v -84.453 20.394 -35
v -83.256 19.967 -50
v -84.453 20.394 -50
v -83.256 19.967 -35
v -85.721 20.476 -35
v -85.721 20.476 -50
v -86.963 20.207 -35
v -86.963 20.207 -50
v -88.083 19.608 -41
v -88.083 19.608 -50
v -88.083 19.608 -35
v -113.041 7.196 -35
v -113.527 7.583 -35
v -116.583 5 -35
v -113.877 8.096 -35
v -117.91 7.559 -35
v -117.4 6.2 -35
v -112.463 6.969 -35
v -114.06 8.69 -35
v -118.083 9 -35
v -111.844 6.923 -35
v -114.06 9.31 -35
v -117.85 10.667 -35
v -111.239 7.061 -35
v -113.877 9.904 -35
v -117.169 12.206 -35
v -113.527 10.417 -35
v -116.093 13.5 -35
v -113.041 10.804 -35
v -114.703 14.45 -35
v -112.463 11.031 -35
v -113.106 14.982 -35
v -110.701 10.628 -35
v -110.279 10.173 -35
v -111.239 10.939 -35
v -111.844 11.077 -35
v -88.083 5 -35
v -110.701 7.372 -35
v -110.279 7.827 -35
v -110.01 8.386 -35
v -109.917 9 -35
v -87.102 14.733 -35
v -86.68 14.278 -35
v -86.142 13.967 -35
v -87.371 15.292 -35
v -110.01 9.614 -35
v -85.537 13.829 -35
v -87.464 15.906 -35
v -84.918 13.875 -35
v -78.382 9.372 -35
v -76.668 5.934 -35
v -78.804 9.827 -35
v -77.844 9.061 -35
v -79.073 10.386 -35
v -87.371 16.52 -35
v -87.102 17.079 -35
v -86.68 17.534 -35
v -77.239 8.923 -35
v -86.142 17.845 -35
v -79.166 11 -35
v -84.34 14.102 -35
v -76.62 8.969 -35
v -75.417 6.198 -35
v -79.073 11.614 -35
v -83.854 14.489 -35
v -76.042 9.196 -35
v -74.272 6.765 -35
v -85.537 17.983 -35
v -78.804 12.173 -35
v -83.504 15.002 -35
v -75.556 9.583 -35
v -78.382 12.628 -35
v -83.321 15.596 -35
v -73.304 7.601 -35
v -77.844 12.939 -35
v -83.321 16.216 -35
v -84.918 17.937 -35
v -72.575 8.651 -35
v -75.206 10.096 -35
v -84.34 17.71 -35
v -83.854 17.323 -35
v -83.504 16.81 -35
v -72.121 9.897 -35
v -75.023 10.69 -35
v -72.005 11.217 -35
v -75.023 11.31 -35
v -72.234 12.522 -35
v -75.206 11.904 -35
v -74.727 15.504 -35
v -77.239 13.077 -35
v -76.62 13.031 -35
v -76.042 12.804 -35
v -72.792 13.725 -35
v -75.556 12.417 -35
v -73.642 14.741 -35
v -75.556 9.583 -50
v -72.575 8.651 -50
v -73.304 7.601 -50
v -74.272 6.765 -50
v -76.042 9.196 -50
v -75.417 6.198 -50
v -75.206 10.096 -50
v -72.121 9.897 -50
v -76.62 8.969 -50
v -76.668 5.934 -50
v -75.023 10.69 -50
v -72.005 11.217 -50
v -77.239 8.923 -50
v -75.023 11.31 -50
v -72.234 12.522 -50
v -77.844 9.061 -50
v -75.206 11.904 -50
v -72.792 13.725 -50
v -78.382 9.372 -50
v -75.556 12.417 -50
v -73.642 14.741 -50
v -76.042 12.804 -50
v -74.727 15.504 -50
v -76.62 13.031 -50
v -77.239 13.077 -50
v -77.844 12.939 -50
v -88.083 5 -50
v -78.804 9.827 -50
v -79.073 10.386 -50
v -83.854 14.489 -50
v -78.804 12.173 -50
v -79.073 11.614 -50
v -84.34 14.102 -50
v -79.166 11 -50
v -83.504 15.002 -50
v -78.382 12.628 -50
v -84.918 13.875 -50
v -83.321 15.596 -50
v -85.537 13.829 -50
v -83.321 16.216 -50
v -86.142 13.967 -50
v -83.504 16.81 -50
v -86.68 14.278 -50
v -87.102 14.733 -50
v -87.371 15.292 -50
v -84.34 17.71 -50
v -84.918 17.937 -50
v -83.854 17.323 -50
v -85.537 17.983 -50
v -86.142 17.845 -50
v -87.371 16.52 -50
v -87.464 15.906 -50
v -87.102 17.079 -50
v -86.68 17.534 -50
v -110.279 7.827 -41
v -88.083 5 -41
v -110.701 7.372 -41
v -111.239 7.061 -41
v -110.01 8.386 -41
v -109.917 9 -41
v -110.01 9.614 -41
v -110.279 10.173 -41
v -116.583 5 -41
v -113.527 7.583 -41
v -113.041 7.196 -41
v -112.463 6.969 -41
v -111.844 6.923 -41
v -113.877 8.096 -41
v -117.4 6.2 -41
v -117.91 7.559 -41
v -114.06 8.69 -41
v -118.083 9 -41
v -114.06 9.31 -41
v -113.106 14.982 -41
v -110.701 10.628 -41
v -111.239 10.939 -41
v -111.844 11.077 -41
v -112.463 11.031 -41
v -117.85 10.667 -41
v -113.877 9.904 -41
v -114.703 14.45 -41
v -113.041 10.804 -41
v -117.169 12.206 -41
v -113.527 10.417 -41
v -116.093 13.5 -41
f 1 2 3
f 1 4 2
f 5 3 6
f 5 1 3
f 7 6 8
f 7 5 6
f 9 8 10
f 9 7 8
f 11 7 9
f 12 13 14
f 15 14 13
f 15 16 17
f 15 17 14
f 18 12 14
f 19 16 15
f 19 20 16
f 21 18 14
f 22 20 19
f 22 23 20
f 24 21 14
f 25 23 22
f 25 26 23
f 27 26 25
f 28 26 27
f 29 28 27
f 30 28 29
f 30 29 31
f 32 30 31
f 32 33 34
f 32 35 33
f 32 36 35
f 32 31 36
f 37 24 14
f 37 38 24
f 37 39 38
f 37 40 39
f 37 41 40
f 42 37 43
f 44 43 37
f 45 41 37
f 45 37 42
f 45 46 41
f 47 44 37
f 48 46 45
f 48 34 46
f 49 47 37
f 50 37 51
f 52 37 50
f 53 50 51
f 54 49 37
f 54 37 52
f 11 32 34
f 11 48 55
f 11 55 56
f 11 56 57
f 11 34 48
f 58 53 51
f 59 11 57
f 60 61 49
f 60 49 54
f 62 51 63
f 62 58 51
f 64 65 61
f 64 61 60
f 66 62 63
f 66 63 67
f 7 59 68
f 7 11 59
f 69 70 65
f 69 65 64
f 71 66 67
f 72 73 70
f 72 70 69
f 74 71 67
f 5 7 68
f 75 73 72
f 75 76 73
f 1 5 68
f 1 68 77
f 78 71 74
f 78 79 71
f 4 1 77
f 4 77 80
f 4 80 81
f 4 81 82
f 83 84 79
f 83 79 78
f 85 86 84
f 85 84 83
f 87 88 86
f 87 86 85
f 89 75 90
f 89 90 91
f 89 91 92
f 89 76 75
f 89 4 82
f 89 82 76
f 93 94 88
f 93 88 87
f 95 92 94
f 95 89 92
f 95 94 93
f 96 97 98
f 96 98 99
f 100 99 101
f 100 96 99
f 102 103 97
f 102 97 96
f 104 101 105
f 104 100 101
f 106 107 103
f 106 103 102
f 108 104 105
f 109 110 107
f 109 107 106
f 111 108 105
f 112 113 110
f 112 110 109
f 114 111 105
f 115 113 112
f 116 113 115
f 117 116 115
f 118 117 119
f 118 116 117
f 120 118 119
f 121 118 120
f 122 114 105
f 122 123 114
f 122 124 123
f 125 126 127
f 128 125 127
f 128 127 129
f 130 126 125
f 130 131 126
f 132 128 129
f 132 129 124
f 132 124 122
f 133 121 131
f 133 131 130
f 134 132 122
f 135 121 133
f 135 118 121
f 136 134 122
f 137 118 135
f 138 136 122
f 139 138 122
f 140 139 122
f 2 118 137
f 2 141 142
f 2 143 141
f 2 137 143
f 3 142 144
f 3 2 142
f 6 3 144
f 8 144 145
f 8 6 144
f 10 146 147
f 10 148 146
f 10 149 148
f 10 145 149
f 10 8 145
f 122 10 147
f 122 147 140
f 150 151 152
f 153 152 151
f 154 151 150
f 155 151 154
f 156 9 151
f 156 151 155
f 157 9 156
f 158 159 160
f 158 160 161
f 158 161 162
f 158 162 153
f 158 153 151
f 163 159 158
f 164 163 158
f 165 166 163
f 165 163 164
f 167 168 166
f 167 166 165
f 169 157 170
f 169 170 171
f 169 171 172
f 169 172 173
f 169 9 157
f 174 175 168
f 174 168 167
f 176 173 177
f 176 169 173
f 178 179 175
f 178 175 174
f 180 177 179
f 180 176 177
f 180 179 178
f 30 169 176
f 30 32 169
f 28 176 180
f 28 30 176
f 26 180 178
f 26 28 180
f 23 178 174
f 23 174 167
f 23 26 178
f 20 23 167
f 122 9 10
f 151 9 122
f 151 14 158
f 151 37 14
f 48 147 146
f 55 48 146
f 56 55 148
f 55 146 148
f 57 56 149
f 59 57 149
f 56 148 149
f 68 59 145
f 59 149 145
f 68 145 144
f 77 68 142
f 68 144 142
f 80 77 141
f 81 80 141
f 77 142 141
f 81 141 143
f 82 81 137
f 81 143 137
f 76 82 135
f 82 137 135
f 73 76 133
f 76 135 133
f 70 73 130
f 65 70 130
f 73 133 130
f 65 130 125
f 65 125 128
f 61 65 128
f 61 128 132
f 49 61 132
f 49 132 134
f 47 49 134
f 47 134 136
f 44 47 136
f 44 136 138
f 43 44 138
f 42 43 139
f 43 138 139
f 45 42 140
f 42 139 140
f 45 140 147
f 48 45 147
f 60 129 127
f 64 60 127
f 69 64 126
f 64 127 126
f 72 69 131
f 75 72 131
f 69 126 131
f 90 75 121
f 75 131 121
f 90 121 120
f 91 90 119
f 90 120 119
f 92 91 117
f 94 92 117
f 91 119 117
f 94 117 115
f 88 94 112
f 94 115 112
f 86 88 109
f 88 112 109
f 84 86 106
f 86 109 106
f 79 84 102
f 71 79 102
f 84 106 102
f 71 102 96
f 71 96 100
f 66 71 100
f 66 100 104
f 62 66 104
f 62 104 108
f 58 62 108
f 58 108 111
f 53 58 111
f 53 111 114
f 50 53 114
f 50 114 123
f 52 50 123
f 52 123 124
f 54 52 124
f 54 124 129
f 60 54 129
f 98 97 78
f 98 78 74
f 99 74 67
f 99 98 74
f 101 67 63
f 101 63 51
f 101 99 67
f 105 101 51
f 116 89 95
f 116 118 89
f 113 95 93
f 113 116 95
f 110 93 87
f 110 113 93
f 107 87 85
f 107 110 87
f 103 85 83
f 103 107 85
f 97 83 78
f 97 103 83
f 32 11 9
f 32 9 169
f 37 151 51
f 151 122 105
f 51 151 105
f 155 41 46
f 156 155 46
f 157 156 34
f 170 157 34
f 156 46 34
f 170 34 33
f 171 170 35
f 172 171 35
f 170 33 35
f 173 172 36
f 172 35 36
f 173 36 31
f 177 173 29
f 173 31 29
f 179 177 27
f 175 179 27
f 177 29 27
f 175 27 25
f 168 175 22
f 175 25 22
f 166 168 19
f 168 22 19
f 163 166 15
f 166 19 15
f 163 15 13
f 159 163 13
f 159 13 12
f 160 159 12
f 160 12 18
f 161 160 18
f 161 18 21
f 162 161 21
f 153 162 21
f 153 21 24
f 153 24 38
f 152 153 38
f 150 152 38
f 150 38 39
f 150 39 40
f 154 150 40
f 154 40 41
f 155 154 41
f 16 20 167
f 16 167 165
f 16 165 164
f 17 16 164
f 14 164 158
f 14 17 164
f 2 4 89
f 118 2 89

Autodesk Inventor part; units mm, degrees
ref_plane "YZ Plane" through (0, 0, 0) normal (1, 0, 0) x (0, 1, 0)
ref_plane "XZ Plane" through (0, 0, 0) normal (0, 1, 0) x (-1, 0, 0)
ref_plane "XY Plane" through (0, 0, 0) normal (0, 0, 1) x (1, 0, 0)
sketch "Sketch1" plane through (0, 0, 0) normal (0, 1, 0) x (-1, 0, 0)
  line L0 (0, 0) -> (0, -35)
  line L1 (0, -35) -> (37, -35)
  line L2 (37, -35) -> (37, -55)
  line L3 (37, -55) -> (48, -55)
  line L4 (48, -55) -> (48, 0)
  line L5 (48, 0) -> (22, 0)
  line L6 (22, 0) -> (22, 0)
  line L7 (22, 0) -> (0, 0)
  dimension "d0" = 35
  dimension "d1" = 37
  dimension "d2" = 20
  dimension "d3" = 11
  dimension "d4" = 55
  dimension "d5" = 26
  dimension "d6" = 0
extrude "Extrusion1" add sketch "Sketch1" along normal blind 50
shell "Shell1" thickness 5 removed faces 3 at (-48, 16.6667, -36.6667) at (-19.6667, 0, -23.3333) at (-19.6667, 50, -23.3333)
sketch "Sketch2" plane through (0, 0, 0) normal (1, 0, 0) x (0, 0, -1)
  line L0 (5, 0) -> (30, 0) projected
  line L1 (5, 0) -> (19, 0)
  line L2 (19, 0) -> (19, 17)
  line L3 (19, 17) -> (5, 17)
  line L4 (5, 17) -> (5, 0)
  point P0 (0, 0)
  dimension "d10" = 17
  dimension "d11" = 0
  dimension "d12" = 11
extrude "Extrusion2" cut sketch "Sketch2" against normal blind 10
sketch "Sketch3" plane through (-48, 0, -55) normal (-1, 0, 0) x (0, 0, 1)
  line L0 (0, 0) -> (0, 50) projected
  line L1 (5, 50) -> (25, 50) projected
  line L2 (0, 0) -> (5, 0)
  line L3 (5, 0) -> (5, 50)
  line L4 (5, 50) -> (0, 50)
  line L5 (0, 50) -> (0, 0)
  point P0 (55, 0)
extrude "Extrusion3" add sketch "Sketch3" along normal blind 15
sketch "Sketch4" plane through (-48, 0, 0) normal (-1, 0, 0) x (0, 0, 1)
  line L0 (-5, 0) -> (0, 0) projected
  line L1 (-5, 0) -> (-5, 50) projected
  line L2 (0, 0) -> (-5, 0)
  line L3 (-5, 0) -> (-5, 50)
  line L4 (-5, 50) -> (0, 50)
  line L5 (0, 50) -> (0, 0)
  point P0 (0, 0)
extrude "Extrusion4" add sketch "Sketch4" along normal blind 15
sketch "Sketch5" plane through (0, 17, -5) normal (0, 0, -1) x (-1, 0, 0)
  circle A0 centre (11.5, -8.5) radius 2.0828
  line L0 (63, -17) -> (0, -17) projected
  line L1 (0, -17) -> (0, 0) projected
  dimension "d19" = 4.1656
  dimension "d20" = 8.5
  dimension "d21" = 11.5
extrude "Extrusion5" cut sketch "Sketch5" against normal blind 15
sketch "Sketch6" plane through (0, 17, -5) normal (0, 0, -1) x (-1, 0, 0)
  circle A0 centre (28.505, 18.46) radius 2.0828
  line L0 (63, -17) -> (0, -17) projected
  line L1 (5, 0) -> (5, 33) projected
  dimension "d24" = 4.1656
  dimension "d25" = 35.46
  dimension "d26" = 23.505
extrude "Extrusion6" cut sketch "Sketch6" against normal blind 15
sketch "Sketch7" plane through (0, 17, -5) normal (0, 0, -1) x (-1, 0, 0)
  circle A0 centre (58.5, 19) radius 2.0828
  line L0 (63, 33) -> (63, -17) projected
  line L1 (5, 33) -> (63, 33) projected
  point P0 (0, -17)
  dimension "d29" = 4.1656
  dimension "d30" = 4.5
  dimension "d31" = 14
extrude "Extrusion7" cut sketch "Sketch7" against normal blind 15
sketch "Sketch13" plane through (0, 0, -35) normal (0, 0, -1) x (-1, 0, 0)
  circle A0 centre (11.5, 8.5) radius 2.0828
  line L0 (0, 0) -> (37, 0) projected
  line L1 (0, 0) -> (0, 50) projected
  dimension "d41" = 4.1656
  dimension "d42" = 8.5
  dimension "d43" = 11.5
extrude "Extrusion9" cut sketch "Sketch13" against normal blind 15
sketch "Sketch14" plane through (-37, 0, -55) normal (0, 0, -1) x (-1, 0, 0)
  circle A0 centre (-8.495, 35.46) radius 2.0828
  line L0 (-37, 0) -> (-37, 50) projected
  line L1 (0, 0) -> (26, 0) projected
  dimension "d46" = 4.1656
  dimension "d47" = 28.505
  dimension "d48" = 35.46
extrude "Extrusion10" cut sketch "Sketch14" against normal blind 15
sketch "Sketch15" plane through (-37, 0, -55) normal (0, 0, -1) x (-1, 0, 0)
  circle A0 centre (21.5, 36) radius 2.0828
  line L0 (0, 0) -> (26, 0) projected
  line L1 (26, 50) -> (26, 0) projected
  point P0 (-37, 0)
  dimension "d51" = 4.1656
  dimension "d52" = 36
  dimension "d53" = 4.5
extrude "Extrusion11" cut sketch "Sketch15" against normal blind 15
sketch "Sketch16" plane through (-42, 0, -30) normal (-1, 0, 0) x (0, 0, 1)
  line L0 (0, 0) -> (-5, 0)
  line L1 (-5, 0) -> (-5, 50)
  line L2 (-5, 50) -> (0, 50)
  line L3 (0, 50) -> (0, 0)
  point P0 (30, 0)
  dimension "d56" = 5
  dimension "d57" = 50
extrude "Extrusion12" add sketch "Sketch16" along normal blind 21
sketch "Sketch17" plane through (-5, 0, -30) normal (0, 0, 1) x (1, 0, 0)
  circle A0 centre (-23.505, 35.46) radius 2.0828
  line L0 (0, 0) -> (0, 50) projected
  line L1 (0, 0) -> (-58, 0) projected
  point P0 (5, 0)
  dimension "d60" = 4.1656
  dimension "d61" = 23.505
  dimension "d62" = 35.46
extrude "Extrusion13" cut sketch "Sketch17" against normal blind 10
sketch "Sketch18" plane through (-42, 0, -35) normal (0, 0, -1) x (-1, 0, 0)
  circle A0 centre (16.5, 36) radius 2.0828
  line L0 (21, 50) -> (21, 0) projected
  line L1 (0, 0) -> (21, 0) projected
  point P0 (-42, 0)
  dimension "d65" = 4.1656
  dimension "d67" = 36
  dimension "d70" = 4.5
extrude "Extrusion14" cut sketch "Sketch18" against normal blind 10
sketch "Sketch20" plane through (-63, 0, 0) normal (-1, 0, 0) x (0, 0, 1)
  line L0 (0, 0) -> (-5, 0) projected
  line L1 (-5, 17) -> (-5, 50) projected
  line L2 (0, 0) -> (-5, 0)
  line L3 (-5, 0) -> (-5, 50)
  line L4 (-5, 50) -> (0, 50)
  line L5 (0, 50) -> (0, 0)
extrude "Extrusion15" add sketch "Sketch20" along normal blind 2.583
sketch "Sketch21" plane through (-63, 0, -30) normal (-1, 0, 0) x (0, 0, 1)
  line L0 (-20, 50) -> (-5, 50) projected
  line L1 (11, 0) -> (0, 0) projected
  line L2 (-5, 50) -> (0, 50)
  line L3 (0, 50) -> (0, 0)
  line L4 (0, 0) -> (-5, 0)
  line L5 (-5, 0) -> (-5, 50)
  point P0 (30, 0)
extrude "Extrusion16" add sketch "Sketch21" along normal blind 2.583
sketch "Sketch22" plane through (-63, 0, -55) normal (-1, 0, 0) x (0, 0, 1)
  line L0 (0, 0) -> (0, 50) projected
  line L1 (5, 0) -> (5, 50) projected
  line L2 (0, 50) -> (5, 50)
  line L3 (5, 50) -> (5, 0)
  line L4 (5, 0) -> (0, 0)
  line L5 (0, 0) -> (0, 50)
  point P0 (55, 0)
extrude "Extrusion17" add sketch "Sketch22" along normal blind 2.583
sketch "Sketch23" plane through (0, 0, 0) normal (0, 0, 1) x (1, 0, 0)
  line L0 (0, 50) -> (-37, 50) projected
  line L1 (-65.583, 50) -> (-65.583, 0) projected
  line L2 (0, 50) -> (-65.583, 50)
  line L3 (-65.583, 50) -> (-65.583, 43.083)
  line L4 (-65.583, 43.083) -> (0, 43.083)
  line L5 (0, 43.083) -> (0, 50)
  point P0 (0, 0)
  dimension "d77" = 6.917
extrude "Extrusion18" cut sketch "Sketch23" against normal blind 100
sketch "Sketch24" plane through (0, 0, -35) normal (0, 0, -1) x (-1, 0, 0)
  line L0 (0, 0) -> (65.583, 0) projected
  line L1 (31.0052, 0) -> (26.0052, 0)
  line L2 (26.0052, 5) -> (31.0052, 5)
  circle A0 centre (28.505, 35.46) radius 2.0828 projected
  line L3 (26.0052, 5) -> (25.0052, 5)
  line L4 (25.0052, 5) -> (26.0052, 0)
  line L5 (31.0052, 5) -> (32.0052, 5)
  line L6 (32.0052, 5) -> (31.0052, 0)
  dimension "d80" = 5
  dimension "d81" = 5
  dimension "d83" = 1
  dimension "d84" = 1
extrude "Extrusion19" cut sketch "Sketch24" against normal blind 100 contours L4 L3 L2 L5 L6 L0
sketch "Sketch25" plane through (-65.583, 0, -55) normal (-1, 0, 0) x (0, 0, 1)
  line L0 (20, 0) -> (0, 0) projected
  line L1 (0, 43.083) -> (20, 43.083) projected
  line L2 (0, 0) -> (5, 0)
  line L3 (5, 0) -> (5, 43.083)
  line L4 (5, 43.083) -> (0, 43.083)
  line L5 (0, 43.083) -> (0, 0)
  point P0 (55, 0)
  dimension "d87" = 5
extrude "Extrusion20" add sketch "Sketch25" along normal blind 22.5
sketch "Sketch28" plane through (-65.583, 0, -30) normal (-1, 0, 0) x (0, 0, 1)
  line L0 (0, 0) -> (-5, 0) projected
  line L1 (-5, 0) -> (-5, 43.083) projected
  line L2 (0, 0) -> (-5, 0)
  line L3 (-5, 0) -> (-5, 43.083)
  line L4 (-5, 43.083) -> (0, 43.083)
  line L5 (0, 43.083) -> (0, 0)
  point P0 (30, 0)
extrude "Extrusion23" add sketch "Sketch28" along normal blind 22.5
sketch "Sketch26" plane through (-37, 0, -55) normal (0, 0, -1) x (-1, 0, 0)
  circle A0 centre (45.232, 36.922) radius 2.0828
  line L0 (51.083, 43.083) -> (51.083, 0) projected
  line L1 (51.083, 43.083) -> (0, 43.083) projected
  point P0 (-37, 0)
  dimension "d90" = 4.1656
  dimension "d91" = 5.851
  dimension "d92" = 6.161
extrude "Extrusion21" cut sketch "Sketch26" against normal blind 25
sketch "Sketch27" plane through (-37, 0, -55) normal (0, 0, -1) x (-1, 0, 0)
  circle A0 centre (48.381, 15.906) radius 2.0828
  line L0 (51.083, 43.083) -> (51.083, 0) projected
  line L1 (0, 0) -> (51.083, 0) projected
  point P0 (-37, 0)
  dimension "d95" = 4.1656
  dimension "d96" = 2.702
  dimension "d97" = 15.906
extrude "Extrusion22" cut sketch "Sketch27" against normal blind 25
sketch "Sketch29" plane through (-42, 0, -35) normal (0, 0, -1) x (-1, 0, 0)
  circle A0 centre (43.381, 15.906) radius 2.0828 projected
  arc A1 (46.083, 19.6075) -> (46.083, 12.2045) centre (43.381, 15.906) ccw
  line L0 (46.083, 43.083) -> (46.083, 0) projected
  line L1 (46.083, 19.6075) -> (46.083, 12.2045)
  point P0 (-42, 0)
  dimension "d102" = 2.5
extrude "Extrusion24" add sketch "Sketch29" along normal up to next
sketch "Sketch30" plane through (-88.083, 0, -55) normal (-1, 0, 0) x (0, 0, 1)
  line L0 (9, 19.6075) -> (20, 19.6075)
  line L1 (20, 19.6075) -> (20, 5)
  line L2 (20, 5) -> (9, 5)
  line L3 (9, 5) -> (9, 19.6075)
  line L4 (0, 43.083) -> (0, 0) projected
  line L5 (25, 0) -> (25, 43.083) projected
  line L6 (0, 0) -> (5, 0) projected
  line L7 (20, 19.6075) -> (5, 19.6075) projected
  point P0 (55, 0)
  dimension "d105" = 9
  dimension "d106" = 5
  dimension "d107" = 5
  dimension "d108" = 0
extrude "Extrusion25" add sketch "Sketch30" along normal blind 30
sketch "Sketch31" plane through (-88.083, 5, -35) normal (0, 0, 1) x (1, 0, 0)
  circle A0 centre (-23.917, 4) radius 2.0828
  line L0 (-30, 0) -> (-30, 14.6075) projected
  line L1 (0, 0) -> (-30, 0) projected
  point P0 (88.083, -5)
  dimension "d111" = 4.1656
  dimension "d112" = 6.083
  dimension "d113" = 4
extrude "Extrusion26" cut sketch "Sketch31" against normal blind 30
sketch "Sketch33" plane through (-88.083, 5, -35) normal (0, 0, 1) x (1, 0, 0)
  circle A0 centre (-23.917, 4) radius 2.0828 projected
  arc A1 (-25.0228, 9.9816) -> (-30, 4) centre (-23.917, 4) ccw
  line L0 (-30, 14.6075) -> (-30, 0) projected
  line L1 (-30, 0) -> (-30, 14.6075) projected
  line L2 (0, 14.6075) -> (-30, 14.6075) projected
  line L3 (-30, 4) -> (-30, 14.6075)
  line L4 (0, 14.6075) -> (-30, 14.6075) projected
  line L5 (-30, 14.6075) -> (0, 14.6075)
  line L6 (0, 14.6075) -> (-25.0228, 9.9816)
  point P0 (88.083, -5)
extrude "Extrusion27" cut sketch "Sketch33" against normal blind 30 contours A1 L0 L2 L6
sketch "Sketch34" plane through (-118.083, 5, -35) normal (0, 0, 1) x (1, 0, 0)
  circle A0 centre (6.083, 4) radius 2.0828 projected
  line L0 (0, 0) -> (0, 4) projected
  arc A1 (0, 4) -> (1.5001, 0) centre (6.083, 4) ccw
  line L1 (30, 0) -> (0, 0) projected
  line L2 (1.5001, 0) -> (0, 0)
  arc A2 (4.9772, 9.9816) -> (0, 4) centre (6.083, 4) ccw projected
  line L3 (0, 0) -> (0, 4)
  point P0 (118.083, -5)
extrude "Extrusion28" cut sketch "Sketch34" against normal blind 30 contours L0 A1 L1
sketch "Sketch35" plane through (-88.083, 5, -46) normal (0, -1, 0) x (1, 0, 0)
  line L0 (0, 0) -> (-28.4999, 0) projected
  line L1 (46.083, 11) -> (0, 11) projected
  line L2 (0, 11) -> (11, 11)
  line L3 (11, 11) -> (11, -4)
  line L4 (11, -4) -> (0, -4)
  line L5 (0, -4) -> (0, 11)
  point P0 (88.083, 46)
  dimension "d130" = 11
  dimension "d131" = 15
  dimension "d132" = 0
  dimension "d133" = 0
extrude "Extrusion29" add sketch "Sketch35" against normal blind 8 and the other way blind 5
sketch "Sketch39" plane through (0, 0, 0) normal (1, 0, 0) x (0, 0, -1)
  line L0 (0, 0) -> (5, 0) projected
  line L1 (35, 43.083) -> (0, 43.083) projected
  line L2 (0, 0) -> (35, 0)
  line L3 (35, 0) -> (35, 43.083)
  line L4 (35, 43.083) -> (0, 43.083)
  line L5 (0, 43.083) -> (0, 0)
extrude "Extrusion30" cut sketch "Sketch39" against normal blind 190
sketch "Sketch40" plane through (-37, 0, -55) normal (0, 0, -1) x (-1, 0, 0)
  line L0 (29.4244, -3.1435) -> (-8.7081, -3.1435)
  line L1 (-8.7081, -3.1435) -> (-8.7081, 47.1531)
  line L2 (-8.7081, 47.1531) -> (29.4244, 47.1531)
  line L3 (29.4244, 47.1531) -> (29.4244, -3.1435)
  point P0 (-37, 0)
extrude "Extrusion31" cut sketch "Sketch40" against normal blind 50
sketch "Sketch41" plane through (-66.4244, 0, -55) normal (1, 0, 0) x (0, 0, -1)
  line L0 (0, 0) -> (-5, 0) projected
  line L1 (-5, 0) -> (13.4745, 0)
  line L2 (13.4745, 0) -> (13.4745, 44.4196)
  line L3 (13.4745, 44.4196) -> (-5, 44.4196)
  line L4 (-5, 44.4196) -> (-5, 0)
  point P0 (-55, 0)
extrude "Extrusion32" cut sketch "Sketch41" against normal blind 50
sketch "Sketch42" plane through (-88.083, 0, -35) normal (0, 0, 1) x (1, 0, 0)
  line L0 (11, 13) -> (6.2456, 13) projected
  line L1 (11, 13) -> (6.2456, 18.812)
  arc A0 (6.2456, 13) -> (0, 19.6075) centre (2.702, 15.906) ccw projected
  line L2 (6.2456, 13) -> (6.2456, 18.812)
  line L3 (6.2456, 13) -> (11, 13)
  point P0 (88.083, 0)
extrude "Extrusion33" add sketch "Sketch42" against normal blind 15
sketch "Sketch43" plane through (0, 0, 0) normal (0, -1, 0) x (1, 0, 0)
  line L0 (-88.083, -50) -> (-77.083, -50) projected
  line L1 (-80.083, -50) -> (-79.083, -45)
  line L2 (-79.083, -45) -> (-86.083, -45)
  line L3 (-86.083, -45) -> (-85.083, -50)
  line L4 (-80.083, -50) -> (-85.083, -50)
  line L5 (-77.083, -50) -> (-77.083, -35) projected
  line L6 (-88.083, -50) -> (-88.083, -35) projected
  point P0 (0, 0)
  dimension "d144" = 3
  dimension "d145" = 3
  dimension "d146" = 5
  dimension "d147" = 1
  dimension "d148" = 1
extrude "Extrusion34" cut sketch "Sketch43" against normal blind 5
sketch "Sketch44" plane through (0, 0, 0) normal (0, -1, 0) x (1, 0, 0)
  line L0 (-77.083, -35) -> (-88.083, -35) projected
  line L1 (-80.083, -35) -> (-79.083, -40)
  line L2 (-79.083, -40) -> (-86.083, -40)
  line L3 (-86.083, -40) -> (-85.083, -35)
  line L4 (-85.083, -35) -> (-80.083, -35)
  line L5 (-77.083, -50) -> (-77.083, -35) projected
  line L6 (-88.083, -50) -> (-88.083, -35) projected
  point P0 (0, 0)
  dimension "d151" = 3
  dimension "d152" = 1
  dimension "d153" = 3
  dimension "d154" = 1
  dimension "d155" = 5
extrude "Extrusion35" cut sketch "Sketch44" against normal blind 5
sketch "Sketch45" plane through (-88.083, 0, -50) normal (0, 0, -1) x (-1, 0, 0)
  line L0 (0, 0) -> (0, 5) construction
  line L1 (0, 0) -> (-16.9719, 16.9719) construction
  line L2 (0, 0) -> (24.0019, 0) construction
  line L3 (-11, 0) -> (-11, 13) projected
  circle A0 centre (-11, 11) radius 2.0828
  point P0 (-88.083, 0)
  dimension "d158" = 135
  dimension "d159" = 4.1656
extrude "Extrusion36" cut sketch "Sketch45" against normal blind 15
sketch "Sketch47" plane through (-88.083, 0, -50) normal (0, 0, -1) x (-1, 0, 0)
  arc A0 (-11, 8.9172) -> (-10.9331, 13.0817) centre (-11, 11) ccw projected
  arc A1 (0, 19.6075) -> (-6.2456, 18.812) centre (-2.702, 15.906) ccw projected
  line L0 (-4.8266, 19.9666) -> (-13.3564, 15.5036)
  line L1 (-11, 8.9172) -> (-11, 0) projected
  line L2 (-11, 0) -> (-15.5076, 8.6514)
  line L3 (-11, 0) -> (-4.8266, 19.9666)
  arc A2 (-13.3564, 15.5036) -> (-15.5076, 8.6514) centre (-11, 11) ccw
  point P0 (-88.083, 0)
extrude "Extrusion37" add sketch "Sketch47" against normal blind 15
sketch "Sketch48" plane through (-88.083, 0, -50) normal (0, 0, -1) x (-1, 0, 0)
  circle A0 centre (-11, 11) radius 2.0828
  arc A1 (-13.3564, 15.5036) -> (-15.5076, 8.6514) centre (-11, 11) ccw projected
  point P0 (-88.083, 0)
  dimension "d165" = 4.1656
  dimension "d166" = 0
  dimension "d167" = 0
extrude "Extrusion38" cut sketch "Sketch48" against normal blind 15
sketch "Sketch49" plane through (-88.083, 0, -50) normal (0, 0, -1) x (-1, 0, 0)
  line L0 (0, 0) -> (-3, 0) projected
  line L1 (-9.9812, 5.352) -> (0, 5.352)
  line L2 (0, 5.352) -> (0, 0)
  line L3 (0, 0) -> (-9.9812, 0)
  line L4 (-9.9812, 0) -> (-9.9812, 5.352)
  point P0 (-88.083, 0)
extrude "Extrusion39" add sketch "Sketch49" against normal blind 15
sketch "Sketch50" plane through (-88.083, 0, -50) normal (0, 0, -1) x (-1, 0, 0)
  circle A0 centre (-11, 11) radius 2.0828 projected
  arc A1 (-16.0823, 10.9293) -> (-11.4146, 5.9341) centre (-11, 11) ccw
  line L0 (0, 5) -> (28.4999, 5) projected
  line L1 (0, 5) -> (-11.4146, 5.9341)
  line L2 (0, 0) -> (0, 5) projected
  line L3 (1.8361, -0.758) -> (0, 5)
  line L4 (1.8361, -0.758) -> (-16.6046, -3.0838)
  line L5 (-16.6046, -3.0838) -> (-16.0823, 10.9293)
  arc A2 (-13.3564, 15.5036) -> (-15.5076, 8.6514) centre (-11, 11) ccw projected
  point P0 (-88.083, 0)
extrude "Extrusion40" cut sketch "Sketch50" against normal blind 15 contours A1 L1 L3 L4 L5
sketch "Sketch51" plane through (-88.083, 5, -46) normal (0, 0, -1) x (-1, 0, 0)
  line L0 (0, 0) -> (28.4999, 0) projected
  line L1 (0, 0) -> (35.6863, 0)
  line L2 (35.6863, 0) -> (35.6863, 18.6429)
  line L3 (35.6863, 18.6429) -> (0, 18.6429)
  line L4 (0, 18.6429) -> (0, 0)
  point P0 (-88.083, -5)
extrude "Extrusion41" cut sketch "Sketch51" against normal blind 5
properties part number "Frame VG01-08"
